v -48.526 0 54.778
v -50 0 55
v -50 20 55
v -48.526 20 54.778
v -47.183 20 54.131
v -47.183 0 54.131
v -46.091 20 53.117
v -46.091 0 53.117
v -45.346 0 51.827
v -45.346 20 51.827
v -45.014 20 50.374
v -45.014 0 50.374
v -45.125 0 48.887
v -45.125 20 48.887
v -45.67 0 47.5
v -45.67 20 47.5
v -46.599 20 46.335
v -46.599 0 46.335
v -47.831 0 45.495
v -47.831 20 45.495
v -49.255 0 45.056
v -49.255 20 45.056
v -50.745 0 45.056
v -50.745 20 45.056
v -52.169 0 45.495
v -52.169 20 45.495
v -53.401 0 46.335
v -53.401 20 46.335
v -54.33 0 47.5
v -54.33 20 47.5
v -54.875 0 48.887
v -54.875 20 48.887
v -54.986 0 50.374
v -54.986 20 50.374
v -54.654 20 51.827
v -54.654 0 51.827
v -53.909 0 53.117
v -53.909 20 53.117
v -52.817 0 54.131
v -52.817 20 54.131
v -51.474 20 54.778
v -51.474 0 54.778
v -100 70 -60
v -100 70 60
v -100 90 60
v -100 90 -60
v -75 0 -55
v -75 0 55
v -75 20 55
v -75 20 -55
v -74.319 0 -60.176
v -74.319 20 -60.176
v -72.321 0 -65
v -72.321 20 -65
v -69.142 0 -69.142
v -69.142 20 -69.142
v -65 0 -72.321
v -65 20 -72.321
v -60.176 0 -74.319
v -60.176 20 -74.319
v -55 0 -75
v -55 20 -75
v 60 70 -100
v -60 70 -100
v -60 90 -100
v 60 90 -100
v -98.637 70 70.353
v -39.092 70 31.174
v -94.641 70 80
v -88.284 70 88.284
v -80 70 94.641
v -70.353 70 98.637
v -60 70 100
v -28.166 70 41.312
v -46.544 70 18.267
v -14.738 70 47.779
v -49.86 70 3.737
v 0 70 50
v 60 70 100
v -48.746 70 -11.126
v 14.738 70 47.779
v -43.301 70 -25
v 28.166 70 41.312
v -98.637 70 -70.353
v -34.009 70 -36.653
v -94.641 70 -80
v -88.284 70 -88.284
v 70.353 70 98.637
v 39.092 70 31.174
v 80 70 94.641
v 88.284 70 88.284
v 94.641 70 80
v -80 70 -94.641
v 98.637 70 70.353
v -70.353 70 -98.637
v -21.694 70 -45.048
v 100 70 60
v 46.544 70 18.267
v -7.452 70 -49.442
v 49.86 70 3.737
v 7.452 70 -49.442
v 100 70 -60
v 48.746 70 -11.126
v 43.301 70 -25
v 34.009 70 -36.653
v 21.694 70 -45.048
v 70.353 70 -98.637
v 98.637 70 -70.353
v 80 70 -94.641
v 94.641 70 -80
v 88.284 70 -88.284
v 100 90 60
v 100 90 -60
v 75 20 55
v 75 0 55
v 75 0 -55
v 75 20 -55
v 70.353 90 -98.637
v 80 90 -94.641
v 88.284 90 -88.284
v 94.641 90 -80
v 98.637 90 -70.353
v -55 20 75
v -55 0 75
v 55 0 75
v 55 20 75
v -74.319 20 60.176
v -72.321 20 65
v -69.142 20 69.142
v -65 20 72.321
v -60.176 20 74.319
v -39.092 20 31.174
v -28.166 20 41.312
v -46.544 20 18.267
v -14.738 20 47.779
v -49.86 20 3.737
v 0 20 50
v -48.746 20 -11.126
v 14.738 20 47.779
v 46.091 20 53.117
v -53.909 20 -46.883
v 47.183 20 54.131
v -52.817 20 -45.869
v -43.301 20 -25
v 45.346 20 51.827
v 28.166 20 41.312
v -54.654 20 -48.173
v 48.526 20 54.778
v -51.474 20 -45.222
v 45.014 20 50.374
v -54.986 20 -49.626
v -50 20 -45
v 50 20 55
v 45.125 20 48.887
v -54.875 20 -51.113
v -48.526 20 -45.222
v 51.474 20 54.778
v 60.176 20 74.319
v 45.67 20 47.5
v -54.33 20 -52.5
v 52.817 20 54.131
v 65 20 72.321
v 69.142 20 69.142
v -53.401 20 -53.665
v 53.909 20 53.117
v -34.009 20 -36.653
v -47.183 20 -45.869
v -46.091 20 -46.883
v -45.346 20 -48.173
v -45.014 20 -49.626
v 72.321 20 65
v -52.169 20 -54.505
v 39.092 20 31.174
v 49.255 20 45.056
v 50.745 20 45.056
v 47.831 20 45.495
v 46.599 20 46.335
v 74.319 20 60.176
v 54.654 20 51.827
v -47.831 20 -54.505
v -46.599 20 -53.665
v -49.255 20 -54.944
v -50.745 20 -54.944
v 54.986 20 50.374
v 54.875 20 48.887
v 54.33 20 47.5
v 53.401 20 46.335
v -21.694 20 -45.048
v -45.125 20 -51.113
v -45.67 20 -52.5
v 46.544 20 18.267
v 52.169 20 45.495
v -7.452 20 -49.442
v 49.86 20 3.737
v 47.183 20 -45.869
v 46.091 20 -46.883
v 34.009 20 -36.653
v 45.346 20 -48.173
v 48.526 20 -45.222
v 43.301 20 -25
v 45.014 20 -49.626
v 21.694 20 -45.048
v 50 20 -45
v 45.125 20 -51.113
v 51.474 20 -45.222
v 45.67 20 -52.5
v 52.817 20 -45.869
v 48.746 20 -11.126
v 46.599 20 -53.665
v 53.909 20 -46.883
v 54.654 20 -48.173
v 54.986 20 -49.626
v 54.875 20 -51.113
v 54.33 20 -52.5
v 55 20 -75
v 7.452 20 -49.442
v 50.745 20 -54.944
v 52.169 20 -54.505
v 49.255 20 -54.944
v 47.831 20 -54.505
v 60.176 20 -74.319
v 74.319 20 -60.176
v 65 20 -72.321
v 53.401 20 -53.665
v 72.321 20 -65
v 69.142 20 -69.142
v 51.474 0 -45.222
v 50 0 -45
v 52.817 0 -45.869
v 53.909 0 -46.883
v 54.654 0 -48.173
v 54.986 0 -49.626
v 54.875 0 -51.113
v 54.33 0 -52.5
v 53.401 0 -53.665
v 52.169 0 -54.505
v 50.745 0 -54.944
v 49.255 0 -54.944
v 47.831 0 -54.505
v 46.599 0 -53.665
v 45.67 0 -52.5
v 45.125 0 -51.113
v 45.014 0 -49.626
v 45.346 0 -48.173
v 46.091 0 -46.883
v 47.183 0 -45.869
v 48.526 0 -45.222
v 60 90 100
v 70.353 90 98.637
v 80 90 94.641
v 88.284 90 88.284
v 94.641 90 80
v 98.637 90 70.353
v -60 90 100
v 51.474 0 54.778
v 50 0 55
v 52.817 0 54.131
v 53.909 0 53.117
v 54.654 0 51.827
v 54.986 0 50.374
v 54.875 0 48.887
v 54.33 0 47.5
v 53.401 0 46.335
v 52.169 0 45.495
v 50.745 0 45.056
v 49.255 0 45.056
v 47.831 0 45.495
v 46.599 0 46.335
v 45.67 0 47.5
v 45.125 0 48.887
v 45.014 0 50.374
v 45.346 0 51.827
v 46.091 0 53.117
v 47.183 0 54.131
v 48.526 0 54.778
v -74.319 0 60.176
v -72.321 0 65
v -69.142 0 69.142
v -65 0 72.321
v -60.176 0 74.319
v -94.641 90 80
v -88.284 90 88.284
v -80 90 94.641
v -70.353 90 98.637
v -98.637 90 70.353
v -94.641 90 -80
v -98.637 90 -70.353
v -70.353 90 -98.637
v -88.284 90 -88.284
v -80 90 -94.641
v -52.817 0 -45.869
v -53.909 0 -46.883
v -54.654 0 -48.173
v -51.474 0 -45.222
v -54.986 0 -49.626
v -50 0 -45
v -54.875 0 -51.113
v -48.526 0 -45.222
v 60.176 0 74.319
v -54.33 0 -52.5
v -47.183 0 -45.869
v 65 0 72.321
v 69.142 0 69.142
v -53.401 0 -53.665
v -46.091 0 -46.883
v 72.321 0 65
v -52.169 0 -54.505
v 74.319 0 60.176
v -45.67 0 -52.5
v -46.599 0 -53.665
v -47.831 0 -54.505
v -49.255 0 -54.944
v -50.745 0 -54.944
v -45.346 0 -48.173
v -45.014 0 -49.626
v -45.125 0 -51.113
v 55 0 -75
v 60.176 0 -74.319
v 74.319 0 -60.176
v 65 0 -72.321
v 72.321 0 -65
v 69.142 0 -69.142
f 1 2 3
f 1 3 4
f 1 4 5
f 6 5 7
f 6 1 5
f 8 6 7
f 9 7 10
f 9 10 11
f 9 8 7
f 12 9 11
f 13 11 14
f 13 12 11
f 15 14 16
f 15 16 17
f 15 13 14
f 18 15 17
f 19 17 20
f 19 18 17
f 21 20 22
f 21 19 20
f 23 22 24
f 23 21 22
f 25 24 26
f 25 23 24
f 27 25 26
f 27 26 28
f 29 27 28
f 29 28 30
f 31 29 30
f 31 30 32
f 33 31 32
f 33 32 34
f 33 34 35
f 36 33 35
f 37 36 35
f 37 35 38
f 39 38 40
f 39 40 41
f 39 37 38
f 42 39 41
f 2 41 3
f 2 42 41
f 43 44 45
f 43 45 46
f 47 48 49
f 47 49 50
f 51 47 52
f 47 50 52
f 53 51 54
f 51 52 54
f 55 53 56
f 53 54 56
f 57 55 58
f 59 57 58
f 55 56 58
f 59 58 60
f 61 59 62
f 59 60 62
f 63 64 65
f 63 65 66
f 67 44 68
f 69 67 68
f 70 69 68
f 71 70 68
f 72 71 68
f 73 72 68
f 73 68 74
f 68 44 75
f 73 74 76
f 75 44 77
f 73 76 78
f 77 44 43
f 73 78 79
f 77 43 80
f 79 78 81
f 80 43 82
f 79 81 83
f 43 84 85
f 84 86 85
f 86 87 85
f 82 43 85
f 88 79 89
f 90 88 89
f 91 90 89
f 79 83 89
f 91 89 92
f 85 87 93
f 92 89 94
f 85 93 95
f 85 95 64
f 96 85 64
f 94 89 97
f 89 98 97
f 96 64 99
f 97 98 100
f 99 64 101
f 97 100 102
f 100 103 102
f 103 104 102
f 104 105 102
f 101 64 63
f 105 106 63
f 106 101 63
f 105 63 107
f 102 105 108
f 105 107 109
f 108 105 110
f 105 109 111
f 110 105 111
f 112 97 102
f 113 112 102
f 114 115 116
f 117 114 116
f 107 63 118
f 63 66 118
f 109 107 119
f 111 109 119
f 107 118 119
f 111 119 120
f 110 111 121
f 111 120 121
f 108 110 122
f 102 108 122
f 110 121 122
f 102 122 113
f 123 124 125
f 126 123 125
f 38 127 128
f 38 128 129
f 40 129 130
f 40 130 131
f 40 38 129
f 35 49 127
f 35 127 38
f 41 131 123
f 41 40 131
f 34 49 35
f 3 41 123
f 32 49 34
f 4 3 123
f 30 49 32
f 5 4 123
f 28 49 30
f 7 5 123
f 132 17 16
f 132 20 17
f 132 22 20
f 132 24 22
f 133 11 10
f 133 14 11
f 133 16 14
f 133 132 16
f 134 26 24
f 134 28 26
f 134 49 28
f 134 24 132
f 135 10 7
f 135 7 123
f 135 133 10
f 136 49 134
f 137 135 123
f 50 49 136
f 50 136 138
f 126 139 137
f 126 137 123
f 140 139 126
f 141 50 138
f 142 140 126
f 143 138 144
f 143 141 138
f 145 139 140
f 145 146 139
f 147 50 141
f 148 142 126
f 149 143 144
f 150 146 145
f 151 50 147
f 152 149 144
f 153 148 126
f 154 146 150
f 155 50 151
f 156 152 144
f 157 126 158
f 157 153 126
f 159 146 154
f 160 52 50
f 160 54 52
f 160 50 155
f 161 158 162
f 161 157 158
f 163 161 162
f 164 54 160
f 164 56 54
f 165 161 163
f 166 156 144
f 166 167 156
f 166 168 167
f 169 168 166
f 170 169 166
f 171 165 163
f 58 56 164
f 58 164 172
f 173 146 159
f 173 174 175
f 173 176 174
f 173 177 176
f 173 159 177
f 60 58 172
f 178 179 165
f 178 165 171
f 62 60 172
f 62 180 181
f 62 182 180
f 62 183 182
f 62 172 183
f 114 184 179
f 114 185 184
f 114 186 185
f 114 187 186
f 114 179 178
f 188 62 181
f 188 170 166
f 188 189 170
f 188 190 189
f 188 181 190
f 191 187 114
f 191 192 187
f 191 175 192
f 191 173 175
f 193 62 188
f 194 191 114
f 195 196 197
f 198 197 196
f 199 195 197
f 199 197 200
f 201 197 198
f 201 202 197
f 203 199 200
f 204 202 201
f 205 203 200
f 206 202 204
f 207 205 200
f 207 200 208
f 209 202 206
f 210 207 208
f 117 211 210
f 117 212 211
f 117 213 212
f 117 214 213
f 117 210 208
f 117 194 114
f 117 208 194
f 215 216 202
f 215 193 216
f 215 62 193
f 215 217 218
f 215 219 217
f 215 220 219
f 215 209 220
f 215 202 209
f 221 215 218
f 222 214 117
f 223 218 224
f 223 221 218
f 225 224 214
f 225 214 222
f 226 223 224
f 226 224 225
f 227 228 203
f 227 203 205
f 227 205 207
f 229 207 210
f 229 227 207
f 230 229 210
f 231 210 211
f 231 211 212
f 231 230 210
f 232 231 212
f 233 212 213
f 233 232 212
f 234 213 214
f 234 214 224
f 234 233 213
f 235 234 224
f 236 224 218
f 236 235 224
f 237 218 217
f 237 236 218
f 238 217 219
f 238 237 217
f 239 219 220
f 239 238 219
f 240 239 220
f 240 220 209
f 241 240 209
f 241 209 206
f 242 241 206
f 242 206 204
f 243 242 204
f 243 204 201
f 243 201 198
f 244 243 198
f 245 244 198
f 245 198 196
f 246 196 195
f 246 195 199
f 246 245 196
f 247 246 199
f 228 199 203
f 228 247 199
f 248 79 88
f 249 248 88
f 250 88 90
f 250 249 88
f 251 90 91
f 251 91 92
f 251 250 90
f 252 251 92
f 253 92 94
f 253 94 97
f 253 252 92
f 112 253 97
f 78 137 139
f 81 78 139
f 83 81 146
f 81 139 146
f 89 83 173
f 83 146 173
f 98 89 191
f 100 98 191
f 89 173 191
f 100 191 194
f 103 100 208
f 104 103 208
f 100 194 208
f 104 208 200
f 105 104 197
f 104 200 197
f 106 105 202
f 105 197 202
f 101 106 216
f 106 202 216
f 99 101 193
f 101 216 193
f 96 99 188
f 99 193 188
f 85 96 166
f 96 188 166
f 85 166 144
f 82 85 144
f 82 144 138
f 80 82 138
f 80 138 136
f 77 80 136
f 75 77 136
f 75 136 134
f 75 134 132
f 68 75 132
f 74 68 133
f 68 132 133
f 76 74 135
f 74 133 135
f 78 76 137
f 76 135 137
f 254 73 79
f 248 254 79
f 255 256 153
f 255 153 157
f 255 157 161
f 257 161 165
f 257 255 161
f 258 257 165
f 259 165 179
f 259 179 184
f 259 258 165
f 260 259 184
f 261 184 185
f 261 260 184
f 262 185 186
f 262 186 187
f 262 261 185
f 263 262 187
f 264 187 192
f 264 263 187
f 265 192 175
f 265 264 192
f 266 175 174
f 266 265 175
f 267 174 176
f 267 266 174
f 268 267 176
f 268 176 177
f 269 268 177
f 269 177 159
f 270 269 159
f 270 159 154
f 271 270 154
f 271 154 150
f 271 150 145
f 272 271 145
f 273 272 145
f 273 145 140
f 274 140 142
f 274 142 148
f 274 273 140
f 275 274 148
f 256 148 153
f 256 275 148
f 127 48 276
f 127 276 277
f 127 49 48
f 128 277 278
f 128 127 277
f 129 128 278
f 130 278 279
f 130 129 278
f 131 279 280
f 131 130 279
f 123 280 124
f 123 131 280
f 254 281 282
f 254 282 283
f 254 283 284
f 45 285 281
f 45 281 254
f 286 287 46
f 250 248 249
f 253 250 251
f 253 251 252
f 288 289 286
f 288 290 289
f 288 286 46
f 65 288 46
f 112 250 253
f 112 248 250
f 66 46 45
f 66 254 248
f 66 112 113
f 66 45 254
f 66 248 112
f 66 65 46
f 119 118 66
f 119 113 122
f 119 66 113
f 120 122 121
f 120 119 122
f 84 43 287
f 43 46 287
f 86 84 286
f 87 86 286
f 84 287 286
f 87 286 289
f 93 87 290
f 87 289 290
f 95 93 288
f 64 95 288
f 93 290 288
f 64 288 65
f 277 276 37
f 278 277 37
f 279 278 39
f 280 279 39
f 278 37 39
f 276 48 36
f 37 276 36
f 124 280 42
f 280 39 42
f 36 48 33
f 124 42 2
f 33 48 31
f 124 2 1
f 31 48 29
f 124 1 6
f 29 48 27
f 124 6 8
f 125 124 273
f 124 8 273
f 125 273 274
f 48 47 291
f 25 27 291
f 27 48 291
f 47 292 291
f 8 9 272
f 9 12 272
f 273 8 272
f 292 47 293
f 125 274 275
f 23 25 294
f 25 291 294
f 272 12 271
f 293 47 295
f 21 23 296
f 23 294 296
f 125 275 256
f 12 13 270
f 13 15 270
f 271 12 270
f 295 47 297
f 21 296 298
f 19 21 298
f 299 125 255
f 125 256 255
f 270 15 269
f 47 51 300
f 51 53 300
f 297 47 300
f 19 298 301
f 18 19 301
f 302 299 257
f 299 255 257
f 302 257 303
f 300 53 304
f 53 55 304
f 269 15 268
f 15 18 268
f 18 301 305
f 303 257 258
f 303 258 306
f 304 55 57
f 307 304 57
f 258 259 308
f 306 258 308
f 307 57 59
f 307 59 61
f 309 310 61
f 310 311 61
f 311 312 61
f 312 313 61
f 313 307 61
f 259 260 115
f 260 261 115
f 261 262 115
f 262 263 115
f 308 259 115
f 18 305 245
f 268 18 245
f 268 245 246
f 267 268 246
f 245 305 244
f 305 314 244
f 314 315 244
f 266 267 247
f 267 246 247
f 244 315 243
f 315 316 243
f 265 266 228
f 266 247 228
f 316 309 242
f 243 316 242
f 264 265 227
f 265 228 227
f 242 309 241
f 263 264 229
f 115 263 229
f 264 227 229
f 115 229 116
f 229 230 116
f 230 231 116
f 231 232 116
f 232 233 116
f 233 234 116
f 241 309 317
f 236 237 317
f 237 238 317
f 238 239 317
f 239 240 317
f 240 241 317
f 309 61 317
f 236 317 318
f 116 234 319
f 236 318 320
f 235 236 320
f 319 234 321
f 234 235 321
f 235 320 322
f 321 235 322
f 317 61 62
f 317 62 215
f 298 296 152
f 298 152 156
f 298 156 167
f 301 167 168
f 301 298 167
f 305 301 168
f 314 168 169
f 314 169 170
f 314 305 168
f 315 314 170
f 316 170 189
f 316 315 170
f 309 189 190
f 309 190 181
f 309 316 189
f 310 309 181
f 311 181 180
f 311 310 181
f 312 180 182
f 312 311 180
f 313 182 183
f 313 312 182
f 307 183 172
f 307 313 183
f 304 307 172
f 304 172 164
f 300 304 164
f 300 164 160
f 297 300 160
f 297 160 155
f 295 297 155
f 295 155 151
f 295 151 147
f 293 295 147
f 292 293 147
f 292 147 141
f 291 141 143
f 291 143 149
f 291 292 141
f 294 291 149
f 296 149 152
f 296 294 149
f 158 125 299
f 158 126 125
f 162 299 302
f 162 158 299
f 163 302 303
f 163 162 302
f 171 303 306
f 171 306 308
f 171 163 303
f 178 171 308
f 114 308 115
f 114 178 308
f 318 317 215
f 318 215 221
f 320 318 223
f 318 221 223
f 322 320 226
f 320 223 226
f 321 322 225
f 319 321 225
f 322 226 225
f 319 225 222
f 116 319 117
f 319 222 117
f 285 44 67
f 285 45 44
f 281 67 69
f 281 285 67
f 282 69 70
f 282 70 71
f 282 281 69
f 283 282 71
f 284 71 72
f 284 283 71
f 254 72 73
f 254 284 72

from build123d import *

# Parameters (mm, degrees)
SKETCH_1_W      = 150
SKETCH_1_H      = 150
SKETCH_1_R      = 5
EXTRUDE_1_DEPTH = 20
FILLET_1_R      = 20
SKETCH_2_R      = 50
EXTRUDE_2_DEPTH = 50
SKETCH_3_W      = 200
SKETCH_3_H      = 200
EXTRUDE_3_DEPTH = 20
FILLET_2_R      = 40


with BuildPart() as part:
    # Эскиз1 → Бобышка-Вытянуть1 (new body)
    with BuildSketch(Plane(origin=(0, 0, 0), x_dir=(1, 0, 0), z_dir=(0, 1, 0))):
        Rectangle(SKETCH_1_W, SKETCH_1_H)
        with Locations(Location((-50, 50, 0), (0, 0, 270))):
            Circle(SKETCH_1_R, mode=Mode.SUBTRACT)
        with Locations(Location((50, 50, 0), (0, 0, 270))):
            Circle(SKETCH_1_R, mode=Mode.SUBTRACT)
        with Locations(Location((50, -50, 0), (0, 0, 270))):
            Circle(SKETCH_1_R, mode=Mode.SUBTRACT)
        with Locations(Location((-50, -50, 0), (0, 0, 270))):
            Circle(SKETCH_1_R, mode=Mode.SUBTRACT)
    extrude(amount=EXTRUDE_1_DEPTH)

    # Скругление1
    fillet_1_edges = [part.edges().sort_by_distance(p)[0] for p in [
        (-75, 10, 75),
        (-75, 10, -75),
        (75, 10, -75),
        (75, 10, 75),
    ]]
    fillet(fillet_1_edges, radius=FILLET_1_R)

    # Эскиз2 → Бобышка-Вытянуть2 (add)
    with BuildSketch(Plane(origin=(0, 20, 0), x_dir=(1, 0, 0), z_dir=(0, 1, 0))):
        with Locations(Location((0, 0, 0), (0, 0, 270))):
            Circle(SKETCH_2_R)
    extrude(amount=EXTRUDE_2_DEPTH)

    # Эскиз3 → Бобышка-Вытянуть3 (add)
    with BuildSketch(Plane(origin=(0, 70, 0), x_dir=(1, 0, 0), z_dir=(0, 1, 0))):
        Rectangle(SKETCH_3_W, SKETCH_3_H)
    extrude(amount=EXTRUDE_3_DEPTH)

    # Скругление2
    fillet_2_edges = [part.edges().sort_by_distance(p)[0] for p in [
        (100, 80, 100),
        (100, 80, -100),
        (-100, 80, -100),
        (-100, 80, 100),
    ]]
    fillet(fillet_2_edges, radius=FILLET_2_R)


solid = part.part
